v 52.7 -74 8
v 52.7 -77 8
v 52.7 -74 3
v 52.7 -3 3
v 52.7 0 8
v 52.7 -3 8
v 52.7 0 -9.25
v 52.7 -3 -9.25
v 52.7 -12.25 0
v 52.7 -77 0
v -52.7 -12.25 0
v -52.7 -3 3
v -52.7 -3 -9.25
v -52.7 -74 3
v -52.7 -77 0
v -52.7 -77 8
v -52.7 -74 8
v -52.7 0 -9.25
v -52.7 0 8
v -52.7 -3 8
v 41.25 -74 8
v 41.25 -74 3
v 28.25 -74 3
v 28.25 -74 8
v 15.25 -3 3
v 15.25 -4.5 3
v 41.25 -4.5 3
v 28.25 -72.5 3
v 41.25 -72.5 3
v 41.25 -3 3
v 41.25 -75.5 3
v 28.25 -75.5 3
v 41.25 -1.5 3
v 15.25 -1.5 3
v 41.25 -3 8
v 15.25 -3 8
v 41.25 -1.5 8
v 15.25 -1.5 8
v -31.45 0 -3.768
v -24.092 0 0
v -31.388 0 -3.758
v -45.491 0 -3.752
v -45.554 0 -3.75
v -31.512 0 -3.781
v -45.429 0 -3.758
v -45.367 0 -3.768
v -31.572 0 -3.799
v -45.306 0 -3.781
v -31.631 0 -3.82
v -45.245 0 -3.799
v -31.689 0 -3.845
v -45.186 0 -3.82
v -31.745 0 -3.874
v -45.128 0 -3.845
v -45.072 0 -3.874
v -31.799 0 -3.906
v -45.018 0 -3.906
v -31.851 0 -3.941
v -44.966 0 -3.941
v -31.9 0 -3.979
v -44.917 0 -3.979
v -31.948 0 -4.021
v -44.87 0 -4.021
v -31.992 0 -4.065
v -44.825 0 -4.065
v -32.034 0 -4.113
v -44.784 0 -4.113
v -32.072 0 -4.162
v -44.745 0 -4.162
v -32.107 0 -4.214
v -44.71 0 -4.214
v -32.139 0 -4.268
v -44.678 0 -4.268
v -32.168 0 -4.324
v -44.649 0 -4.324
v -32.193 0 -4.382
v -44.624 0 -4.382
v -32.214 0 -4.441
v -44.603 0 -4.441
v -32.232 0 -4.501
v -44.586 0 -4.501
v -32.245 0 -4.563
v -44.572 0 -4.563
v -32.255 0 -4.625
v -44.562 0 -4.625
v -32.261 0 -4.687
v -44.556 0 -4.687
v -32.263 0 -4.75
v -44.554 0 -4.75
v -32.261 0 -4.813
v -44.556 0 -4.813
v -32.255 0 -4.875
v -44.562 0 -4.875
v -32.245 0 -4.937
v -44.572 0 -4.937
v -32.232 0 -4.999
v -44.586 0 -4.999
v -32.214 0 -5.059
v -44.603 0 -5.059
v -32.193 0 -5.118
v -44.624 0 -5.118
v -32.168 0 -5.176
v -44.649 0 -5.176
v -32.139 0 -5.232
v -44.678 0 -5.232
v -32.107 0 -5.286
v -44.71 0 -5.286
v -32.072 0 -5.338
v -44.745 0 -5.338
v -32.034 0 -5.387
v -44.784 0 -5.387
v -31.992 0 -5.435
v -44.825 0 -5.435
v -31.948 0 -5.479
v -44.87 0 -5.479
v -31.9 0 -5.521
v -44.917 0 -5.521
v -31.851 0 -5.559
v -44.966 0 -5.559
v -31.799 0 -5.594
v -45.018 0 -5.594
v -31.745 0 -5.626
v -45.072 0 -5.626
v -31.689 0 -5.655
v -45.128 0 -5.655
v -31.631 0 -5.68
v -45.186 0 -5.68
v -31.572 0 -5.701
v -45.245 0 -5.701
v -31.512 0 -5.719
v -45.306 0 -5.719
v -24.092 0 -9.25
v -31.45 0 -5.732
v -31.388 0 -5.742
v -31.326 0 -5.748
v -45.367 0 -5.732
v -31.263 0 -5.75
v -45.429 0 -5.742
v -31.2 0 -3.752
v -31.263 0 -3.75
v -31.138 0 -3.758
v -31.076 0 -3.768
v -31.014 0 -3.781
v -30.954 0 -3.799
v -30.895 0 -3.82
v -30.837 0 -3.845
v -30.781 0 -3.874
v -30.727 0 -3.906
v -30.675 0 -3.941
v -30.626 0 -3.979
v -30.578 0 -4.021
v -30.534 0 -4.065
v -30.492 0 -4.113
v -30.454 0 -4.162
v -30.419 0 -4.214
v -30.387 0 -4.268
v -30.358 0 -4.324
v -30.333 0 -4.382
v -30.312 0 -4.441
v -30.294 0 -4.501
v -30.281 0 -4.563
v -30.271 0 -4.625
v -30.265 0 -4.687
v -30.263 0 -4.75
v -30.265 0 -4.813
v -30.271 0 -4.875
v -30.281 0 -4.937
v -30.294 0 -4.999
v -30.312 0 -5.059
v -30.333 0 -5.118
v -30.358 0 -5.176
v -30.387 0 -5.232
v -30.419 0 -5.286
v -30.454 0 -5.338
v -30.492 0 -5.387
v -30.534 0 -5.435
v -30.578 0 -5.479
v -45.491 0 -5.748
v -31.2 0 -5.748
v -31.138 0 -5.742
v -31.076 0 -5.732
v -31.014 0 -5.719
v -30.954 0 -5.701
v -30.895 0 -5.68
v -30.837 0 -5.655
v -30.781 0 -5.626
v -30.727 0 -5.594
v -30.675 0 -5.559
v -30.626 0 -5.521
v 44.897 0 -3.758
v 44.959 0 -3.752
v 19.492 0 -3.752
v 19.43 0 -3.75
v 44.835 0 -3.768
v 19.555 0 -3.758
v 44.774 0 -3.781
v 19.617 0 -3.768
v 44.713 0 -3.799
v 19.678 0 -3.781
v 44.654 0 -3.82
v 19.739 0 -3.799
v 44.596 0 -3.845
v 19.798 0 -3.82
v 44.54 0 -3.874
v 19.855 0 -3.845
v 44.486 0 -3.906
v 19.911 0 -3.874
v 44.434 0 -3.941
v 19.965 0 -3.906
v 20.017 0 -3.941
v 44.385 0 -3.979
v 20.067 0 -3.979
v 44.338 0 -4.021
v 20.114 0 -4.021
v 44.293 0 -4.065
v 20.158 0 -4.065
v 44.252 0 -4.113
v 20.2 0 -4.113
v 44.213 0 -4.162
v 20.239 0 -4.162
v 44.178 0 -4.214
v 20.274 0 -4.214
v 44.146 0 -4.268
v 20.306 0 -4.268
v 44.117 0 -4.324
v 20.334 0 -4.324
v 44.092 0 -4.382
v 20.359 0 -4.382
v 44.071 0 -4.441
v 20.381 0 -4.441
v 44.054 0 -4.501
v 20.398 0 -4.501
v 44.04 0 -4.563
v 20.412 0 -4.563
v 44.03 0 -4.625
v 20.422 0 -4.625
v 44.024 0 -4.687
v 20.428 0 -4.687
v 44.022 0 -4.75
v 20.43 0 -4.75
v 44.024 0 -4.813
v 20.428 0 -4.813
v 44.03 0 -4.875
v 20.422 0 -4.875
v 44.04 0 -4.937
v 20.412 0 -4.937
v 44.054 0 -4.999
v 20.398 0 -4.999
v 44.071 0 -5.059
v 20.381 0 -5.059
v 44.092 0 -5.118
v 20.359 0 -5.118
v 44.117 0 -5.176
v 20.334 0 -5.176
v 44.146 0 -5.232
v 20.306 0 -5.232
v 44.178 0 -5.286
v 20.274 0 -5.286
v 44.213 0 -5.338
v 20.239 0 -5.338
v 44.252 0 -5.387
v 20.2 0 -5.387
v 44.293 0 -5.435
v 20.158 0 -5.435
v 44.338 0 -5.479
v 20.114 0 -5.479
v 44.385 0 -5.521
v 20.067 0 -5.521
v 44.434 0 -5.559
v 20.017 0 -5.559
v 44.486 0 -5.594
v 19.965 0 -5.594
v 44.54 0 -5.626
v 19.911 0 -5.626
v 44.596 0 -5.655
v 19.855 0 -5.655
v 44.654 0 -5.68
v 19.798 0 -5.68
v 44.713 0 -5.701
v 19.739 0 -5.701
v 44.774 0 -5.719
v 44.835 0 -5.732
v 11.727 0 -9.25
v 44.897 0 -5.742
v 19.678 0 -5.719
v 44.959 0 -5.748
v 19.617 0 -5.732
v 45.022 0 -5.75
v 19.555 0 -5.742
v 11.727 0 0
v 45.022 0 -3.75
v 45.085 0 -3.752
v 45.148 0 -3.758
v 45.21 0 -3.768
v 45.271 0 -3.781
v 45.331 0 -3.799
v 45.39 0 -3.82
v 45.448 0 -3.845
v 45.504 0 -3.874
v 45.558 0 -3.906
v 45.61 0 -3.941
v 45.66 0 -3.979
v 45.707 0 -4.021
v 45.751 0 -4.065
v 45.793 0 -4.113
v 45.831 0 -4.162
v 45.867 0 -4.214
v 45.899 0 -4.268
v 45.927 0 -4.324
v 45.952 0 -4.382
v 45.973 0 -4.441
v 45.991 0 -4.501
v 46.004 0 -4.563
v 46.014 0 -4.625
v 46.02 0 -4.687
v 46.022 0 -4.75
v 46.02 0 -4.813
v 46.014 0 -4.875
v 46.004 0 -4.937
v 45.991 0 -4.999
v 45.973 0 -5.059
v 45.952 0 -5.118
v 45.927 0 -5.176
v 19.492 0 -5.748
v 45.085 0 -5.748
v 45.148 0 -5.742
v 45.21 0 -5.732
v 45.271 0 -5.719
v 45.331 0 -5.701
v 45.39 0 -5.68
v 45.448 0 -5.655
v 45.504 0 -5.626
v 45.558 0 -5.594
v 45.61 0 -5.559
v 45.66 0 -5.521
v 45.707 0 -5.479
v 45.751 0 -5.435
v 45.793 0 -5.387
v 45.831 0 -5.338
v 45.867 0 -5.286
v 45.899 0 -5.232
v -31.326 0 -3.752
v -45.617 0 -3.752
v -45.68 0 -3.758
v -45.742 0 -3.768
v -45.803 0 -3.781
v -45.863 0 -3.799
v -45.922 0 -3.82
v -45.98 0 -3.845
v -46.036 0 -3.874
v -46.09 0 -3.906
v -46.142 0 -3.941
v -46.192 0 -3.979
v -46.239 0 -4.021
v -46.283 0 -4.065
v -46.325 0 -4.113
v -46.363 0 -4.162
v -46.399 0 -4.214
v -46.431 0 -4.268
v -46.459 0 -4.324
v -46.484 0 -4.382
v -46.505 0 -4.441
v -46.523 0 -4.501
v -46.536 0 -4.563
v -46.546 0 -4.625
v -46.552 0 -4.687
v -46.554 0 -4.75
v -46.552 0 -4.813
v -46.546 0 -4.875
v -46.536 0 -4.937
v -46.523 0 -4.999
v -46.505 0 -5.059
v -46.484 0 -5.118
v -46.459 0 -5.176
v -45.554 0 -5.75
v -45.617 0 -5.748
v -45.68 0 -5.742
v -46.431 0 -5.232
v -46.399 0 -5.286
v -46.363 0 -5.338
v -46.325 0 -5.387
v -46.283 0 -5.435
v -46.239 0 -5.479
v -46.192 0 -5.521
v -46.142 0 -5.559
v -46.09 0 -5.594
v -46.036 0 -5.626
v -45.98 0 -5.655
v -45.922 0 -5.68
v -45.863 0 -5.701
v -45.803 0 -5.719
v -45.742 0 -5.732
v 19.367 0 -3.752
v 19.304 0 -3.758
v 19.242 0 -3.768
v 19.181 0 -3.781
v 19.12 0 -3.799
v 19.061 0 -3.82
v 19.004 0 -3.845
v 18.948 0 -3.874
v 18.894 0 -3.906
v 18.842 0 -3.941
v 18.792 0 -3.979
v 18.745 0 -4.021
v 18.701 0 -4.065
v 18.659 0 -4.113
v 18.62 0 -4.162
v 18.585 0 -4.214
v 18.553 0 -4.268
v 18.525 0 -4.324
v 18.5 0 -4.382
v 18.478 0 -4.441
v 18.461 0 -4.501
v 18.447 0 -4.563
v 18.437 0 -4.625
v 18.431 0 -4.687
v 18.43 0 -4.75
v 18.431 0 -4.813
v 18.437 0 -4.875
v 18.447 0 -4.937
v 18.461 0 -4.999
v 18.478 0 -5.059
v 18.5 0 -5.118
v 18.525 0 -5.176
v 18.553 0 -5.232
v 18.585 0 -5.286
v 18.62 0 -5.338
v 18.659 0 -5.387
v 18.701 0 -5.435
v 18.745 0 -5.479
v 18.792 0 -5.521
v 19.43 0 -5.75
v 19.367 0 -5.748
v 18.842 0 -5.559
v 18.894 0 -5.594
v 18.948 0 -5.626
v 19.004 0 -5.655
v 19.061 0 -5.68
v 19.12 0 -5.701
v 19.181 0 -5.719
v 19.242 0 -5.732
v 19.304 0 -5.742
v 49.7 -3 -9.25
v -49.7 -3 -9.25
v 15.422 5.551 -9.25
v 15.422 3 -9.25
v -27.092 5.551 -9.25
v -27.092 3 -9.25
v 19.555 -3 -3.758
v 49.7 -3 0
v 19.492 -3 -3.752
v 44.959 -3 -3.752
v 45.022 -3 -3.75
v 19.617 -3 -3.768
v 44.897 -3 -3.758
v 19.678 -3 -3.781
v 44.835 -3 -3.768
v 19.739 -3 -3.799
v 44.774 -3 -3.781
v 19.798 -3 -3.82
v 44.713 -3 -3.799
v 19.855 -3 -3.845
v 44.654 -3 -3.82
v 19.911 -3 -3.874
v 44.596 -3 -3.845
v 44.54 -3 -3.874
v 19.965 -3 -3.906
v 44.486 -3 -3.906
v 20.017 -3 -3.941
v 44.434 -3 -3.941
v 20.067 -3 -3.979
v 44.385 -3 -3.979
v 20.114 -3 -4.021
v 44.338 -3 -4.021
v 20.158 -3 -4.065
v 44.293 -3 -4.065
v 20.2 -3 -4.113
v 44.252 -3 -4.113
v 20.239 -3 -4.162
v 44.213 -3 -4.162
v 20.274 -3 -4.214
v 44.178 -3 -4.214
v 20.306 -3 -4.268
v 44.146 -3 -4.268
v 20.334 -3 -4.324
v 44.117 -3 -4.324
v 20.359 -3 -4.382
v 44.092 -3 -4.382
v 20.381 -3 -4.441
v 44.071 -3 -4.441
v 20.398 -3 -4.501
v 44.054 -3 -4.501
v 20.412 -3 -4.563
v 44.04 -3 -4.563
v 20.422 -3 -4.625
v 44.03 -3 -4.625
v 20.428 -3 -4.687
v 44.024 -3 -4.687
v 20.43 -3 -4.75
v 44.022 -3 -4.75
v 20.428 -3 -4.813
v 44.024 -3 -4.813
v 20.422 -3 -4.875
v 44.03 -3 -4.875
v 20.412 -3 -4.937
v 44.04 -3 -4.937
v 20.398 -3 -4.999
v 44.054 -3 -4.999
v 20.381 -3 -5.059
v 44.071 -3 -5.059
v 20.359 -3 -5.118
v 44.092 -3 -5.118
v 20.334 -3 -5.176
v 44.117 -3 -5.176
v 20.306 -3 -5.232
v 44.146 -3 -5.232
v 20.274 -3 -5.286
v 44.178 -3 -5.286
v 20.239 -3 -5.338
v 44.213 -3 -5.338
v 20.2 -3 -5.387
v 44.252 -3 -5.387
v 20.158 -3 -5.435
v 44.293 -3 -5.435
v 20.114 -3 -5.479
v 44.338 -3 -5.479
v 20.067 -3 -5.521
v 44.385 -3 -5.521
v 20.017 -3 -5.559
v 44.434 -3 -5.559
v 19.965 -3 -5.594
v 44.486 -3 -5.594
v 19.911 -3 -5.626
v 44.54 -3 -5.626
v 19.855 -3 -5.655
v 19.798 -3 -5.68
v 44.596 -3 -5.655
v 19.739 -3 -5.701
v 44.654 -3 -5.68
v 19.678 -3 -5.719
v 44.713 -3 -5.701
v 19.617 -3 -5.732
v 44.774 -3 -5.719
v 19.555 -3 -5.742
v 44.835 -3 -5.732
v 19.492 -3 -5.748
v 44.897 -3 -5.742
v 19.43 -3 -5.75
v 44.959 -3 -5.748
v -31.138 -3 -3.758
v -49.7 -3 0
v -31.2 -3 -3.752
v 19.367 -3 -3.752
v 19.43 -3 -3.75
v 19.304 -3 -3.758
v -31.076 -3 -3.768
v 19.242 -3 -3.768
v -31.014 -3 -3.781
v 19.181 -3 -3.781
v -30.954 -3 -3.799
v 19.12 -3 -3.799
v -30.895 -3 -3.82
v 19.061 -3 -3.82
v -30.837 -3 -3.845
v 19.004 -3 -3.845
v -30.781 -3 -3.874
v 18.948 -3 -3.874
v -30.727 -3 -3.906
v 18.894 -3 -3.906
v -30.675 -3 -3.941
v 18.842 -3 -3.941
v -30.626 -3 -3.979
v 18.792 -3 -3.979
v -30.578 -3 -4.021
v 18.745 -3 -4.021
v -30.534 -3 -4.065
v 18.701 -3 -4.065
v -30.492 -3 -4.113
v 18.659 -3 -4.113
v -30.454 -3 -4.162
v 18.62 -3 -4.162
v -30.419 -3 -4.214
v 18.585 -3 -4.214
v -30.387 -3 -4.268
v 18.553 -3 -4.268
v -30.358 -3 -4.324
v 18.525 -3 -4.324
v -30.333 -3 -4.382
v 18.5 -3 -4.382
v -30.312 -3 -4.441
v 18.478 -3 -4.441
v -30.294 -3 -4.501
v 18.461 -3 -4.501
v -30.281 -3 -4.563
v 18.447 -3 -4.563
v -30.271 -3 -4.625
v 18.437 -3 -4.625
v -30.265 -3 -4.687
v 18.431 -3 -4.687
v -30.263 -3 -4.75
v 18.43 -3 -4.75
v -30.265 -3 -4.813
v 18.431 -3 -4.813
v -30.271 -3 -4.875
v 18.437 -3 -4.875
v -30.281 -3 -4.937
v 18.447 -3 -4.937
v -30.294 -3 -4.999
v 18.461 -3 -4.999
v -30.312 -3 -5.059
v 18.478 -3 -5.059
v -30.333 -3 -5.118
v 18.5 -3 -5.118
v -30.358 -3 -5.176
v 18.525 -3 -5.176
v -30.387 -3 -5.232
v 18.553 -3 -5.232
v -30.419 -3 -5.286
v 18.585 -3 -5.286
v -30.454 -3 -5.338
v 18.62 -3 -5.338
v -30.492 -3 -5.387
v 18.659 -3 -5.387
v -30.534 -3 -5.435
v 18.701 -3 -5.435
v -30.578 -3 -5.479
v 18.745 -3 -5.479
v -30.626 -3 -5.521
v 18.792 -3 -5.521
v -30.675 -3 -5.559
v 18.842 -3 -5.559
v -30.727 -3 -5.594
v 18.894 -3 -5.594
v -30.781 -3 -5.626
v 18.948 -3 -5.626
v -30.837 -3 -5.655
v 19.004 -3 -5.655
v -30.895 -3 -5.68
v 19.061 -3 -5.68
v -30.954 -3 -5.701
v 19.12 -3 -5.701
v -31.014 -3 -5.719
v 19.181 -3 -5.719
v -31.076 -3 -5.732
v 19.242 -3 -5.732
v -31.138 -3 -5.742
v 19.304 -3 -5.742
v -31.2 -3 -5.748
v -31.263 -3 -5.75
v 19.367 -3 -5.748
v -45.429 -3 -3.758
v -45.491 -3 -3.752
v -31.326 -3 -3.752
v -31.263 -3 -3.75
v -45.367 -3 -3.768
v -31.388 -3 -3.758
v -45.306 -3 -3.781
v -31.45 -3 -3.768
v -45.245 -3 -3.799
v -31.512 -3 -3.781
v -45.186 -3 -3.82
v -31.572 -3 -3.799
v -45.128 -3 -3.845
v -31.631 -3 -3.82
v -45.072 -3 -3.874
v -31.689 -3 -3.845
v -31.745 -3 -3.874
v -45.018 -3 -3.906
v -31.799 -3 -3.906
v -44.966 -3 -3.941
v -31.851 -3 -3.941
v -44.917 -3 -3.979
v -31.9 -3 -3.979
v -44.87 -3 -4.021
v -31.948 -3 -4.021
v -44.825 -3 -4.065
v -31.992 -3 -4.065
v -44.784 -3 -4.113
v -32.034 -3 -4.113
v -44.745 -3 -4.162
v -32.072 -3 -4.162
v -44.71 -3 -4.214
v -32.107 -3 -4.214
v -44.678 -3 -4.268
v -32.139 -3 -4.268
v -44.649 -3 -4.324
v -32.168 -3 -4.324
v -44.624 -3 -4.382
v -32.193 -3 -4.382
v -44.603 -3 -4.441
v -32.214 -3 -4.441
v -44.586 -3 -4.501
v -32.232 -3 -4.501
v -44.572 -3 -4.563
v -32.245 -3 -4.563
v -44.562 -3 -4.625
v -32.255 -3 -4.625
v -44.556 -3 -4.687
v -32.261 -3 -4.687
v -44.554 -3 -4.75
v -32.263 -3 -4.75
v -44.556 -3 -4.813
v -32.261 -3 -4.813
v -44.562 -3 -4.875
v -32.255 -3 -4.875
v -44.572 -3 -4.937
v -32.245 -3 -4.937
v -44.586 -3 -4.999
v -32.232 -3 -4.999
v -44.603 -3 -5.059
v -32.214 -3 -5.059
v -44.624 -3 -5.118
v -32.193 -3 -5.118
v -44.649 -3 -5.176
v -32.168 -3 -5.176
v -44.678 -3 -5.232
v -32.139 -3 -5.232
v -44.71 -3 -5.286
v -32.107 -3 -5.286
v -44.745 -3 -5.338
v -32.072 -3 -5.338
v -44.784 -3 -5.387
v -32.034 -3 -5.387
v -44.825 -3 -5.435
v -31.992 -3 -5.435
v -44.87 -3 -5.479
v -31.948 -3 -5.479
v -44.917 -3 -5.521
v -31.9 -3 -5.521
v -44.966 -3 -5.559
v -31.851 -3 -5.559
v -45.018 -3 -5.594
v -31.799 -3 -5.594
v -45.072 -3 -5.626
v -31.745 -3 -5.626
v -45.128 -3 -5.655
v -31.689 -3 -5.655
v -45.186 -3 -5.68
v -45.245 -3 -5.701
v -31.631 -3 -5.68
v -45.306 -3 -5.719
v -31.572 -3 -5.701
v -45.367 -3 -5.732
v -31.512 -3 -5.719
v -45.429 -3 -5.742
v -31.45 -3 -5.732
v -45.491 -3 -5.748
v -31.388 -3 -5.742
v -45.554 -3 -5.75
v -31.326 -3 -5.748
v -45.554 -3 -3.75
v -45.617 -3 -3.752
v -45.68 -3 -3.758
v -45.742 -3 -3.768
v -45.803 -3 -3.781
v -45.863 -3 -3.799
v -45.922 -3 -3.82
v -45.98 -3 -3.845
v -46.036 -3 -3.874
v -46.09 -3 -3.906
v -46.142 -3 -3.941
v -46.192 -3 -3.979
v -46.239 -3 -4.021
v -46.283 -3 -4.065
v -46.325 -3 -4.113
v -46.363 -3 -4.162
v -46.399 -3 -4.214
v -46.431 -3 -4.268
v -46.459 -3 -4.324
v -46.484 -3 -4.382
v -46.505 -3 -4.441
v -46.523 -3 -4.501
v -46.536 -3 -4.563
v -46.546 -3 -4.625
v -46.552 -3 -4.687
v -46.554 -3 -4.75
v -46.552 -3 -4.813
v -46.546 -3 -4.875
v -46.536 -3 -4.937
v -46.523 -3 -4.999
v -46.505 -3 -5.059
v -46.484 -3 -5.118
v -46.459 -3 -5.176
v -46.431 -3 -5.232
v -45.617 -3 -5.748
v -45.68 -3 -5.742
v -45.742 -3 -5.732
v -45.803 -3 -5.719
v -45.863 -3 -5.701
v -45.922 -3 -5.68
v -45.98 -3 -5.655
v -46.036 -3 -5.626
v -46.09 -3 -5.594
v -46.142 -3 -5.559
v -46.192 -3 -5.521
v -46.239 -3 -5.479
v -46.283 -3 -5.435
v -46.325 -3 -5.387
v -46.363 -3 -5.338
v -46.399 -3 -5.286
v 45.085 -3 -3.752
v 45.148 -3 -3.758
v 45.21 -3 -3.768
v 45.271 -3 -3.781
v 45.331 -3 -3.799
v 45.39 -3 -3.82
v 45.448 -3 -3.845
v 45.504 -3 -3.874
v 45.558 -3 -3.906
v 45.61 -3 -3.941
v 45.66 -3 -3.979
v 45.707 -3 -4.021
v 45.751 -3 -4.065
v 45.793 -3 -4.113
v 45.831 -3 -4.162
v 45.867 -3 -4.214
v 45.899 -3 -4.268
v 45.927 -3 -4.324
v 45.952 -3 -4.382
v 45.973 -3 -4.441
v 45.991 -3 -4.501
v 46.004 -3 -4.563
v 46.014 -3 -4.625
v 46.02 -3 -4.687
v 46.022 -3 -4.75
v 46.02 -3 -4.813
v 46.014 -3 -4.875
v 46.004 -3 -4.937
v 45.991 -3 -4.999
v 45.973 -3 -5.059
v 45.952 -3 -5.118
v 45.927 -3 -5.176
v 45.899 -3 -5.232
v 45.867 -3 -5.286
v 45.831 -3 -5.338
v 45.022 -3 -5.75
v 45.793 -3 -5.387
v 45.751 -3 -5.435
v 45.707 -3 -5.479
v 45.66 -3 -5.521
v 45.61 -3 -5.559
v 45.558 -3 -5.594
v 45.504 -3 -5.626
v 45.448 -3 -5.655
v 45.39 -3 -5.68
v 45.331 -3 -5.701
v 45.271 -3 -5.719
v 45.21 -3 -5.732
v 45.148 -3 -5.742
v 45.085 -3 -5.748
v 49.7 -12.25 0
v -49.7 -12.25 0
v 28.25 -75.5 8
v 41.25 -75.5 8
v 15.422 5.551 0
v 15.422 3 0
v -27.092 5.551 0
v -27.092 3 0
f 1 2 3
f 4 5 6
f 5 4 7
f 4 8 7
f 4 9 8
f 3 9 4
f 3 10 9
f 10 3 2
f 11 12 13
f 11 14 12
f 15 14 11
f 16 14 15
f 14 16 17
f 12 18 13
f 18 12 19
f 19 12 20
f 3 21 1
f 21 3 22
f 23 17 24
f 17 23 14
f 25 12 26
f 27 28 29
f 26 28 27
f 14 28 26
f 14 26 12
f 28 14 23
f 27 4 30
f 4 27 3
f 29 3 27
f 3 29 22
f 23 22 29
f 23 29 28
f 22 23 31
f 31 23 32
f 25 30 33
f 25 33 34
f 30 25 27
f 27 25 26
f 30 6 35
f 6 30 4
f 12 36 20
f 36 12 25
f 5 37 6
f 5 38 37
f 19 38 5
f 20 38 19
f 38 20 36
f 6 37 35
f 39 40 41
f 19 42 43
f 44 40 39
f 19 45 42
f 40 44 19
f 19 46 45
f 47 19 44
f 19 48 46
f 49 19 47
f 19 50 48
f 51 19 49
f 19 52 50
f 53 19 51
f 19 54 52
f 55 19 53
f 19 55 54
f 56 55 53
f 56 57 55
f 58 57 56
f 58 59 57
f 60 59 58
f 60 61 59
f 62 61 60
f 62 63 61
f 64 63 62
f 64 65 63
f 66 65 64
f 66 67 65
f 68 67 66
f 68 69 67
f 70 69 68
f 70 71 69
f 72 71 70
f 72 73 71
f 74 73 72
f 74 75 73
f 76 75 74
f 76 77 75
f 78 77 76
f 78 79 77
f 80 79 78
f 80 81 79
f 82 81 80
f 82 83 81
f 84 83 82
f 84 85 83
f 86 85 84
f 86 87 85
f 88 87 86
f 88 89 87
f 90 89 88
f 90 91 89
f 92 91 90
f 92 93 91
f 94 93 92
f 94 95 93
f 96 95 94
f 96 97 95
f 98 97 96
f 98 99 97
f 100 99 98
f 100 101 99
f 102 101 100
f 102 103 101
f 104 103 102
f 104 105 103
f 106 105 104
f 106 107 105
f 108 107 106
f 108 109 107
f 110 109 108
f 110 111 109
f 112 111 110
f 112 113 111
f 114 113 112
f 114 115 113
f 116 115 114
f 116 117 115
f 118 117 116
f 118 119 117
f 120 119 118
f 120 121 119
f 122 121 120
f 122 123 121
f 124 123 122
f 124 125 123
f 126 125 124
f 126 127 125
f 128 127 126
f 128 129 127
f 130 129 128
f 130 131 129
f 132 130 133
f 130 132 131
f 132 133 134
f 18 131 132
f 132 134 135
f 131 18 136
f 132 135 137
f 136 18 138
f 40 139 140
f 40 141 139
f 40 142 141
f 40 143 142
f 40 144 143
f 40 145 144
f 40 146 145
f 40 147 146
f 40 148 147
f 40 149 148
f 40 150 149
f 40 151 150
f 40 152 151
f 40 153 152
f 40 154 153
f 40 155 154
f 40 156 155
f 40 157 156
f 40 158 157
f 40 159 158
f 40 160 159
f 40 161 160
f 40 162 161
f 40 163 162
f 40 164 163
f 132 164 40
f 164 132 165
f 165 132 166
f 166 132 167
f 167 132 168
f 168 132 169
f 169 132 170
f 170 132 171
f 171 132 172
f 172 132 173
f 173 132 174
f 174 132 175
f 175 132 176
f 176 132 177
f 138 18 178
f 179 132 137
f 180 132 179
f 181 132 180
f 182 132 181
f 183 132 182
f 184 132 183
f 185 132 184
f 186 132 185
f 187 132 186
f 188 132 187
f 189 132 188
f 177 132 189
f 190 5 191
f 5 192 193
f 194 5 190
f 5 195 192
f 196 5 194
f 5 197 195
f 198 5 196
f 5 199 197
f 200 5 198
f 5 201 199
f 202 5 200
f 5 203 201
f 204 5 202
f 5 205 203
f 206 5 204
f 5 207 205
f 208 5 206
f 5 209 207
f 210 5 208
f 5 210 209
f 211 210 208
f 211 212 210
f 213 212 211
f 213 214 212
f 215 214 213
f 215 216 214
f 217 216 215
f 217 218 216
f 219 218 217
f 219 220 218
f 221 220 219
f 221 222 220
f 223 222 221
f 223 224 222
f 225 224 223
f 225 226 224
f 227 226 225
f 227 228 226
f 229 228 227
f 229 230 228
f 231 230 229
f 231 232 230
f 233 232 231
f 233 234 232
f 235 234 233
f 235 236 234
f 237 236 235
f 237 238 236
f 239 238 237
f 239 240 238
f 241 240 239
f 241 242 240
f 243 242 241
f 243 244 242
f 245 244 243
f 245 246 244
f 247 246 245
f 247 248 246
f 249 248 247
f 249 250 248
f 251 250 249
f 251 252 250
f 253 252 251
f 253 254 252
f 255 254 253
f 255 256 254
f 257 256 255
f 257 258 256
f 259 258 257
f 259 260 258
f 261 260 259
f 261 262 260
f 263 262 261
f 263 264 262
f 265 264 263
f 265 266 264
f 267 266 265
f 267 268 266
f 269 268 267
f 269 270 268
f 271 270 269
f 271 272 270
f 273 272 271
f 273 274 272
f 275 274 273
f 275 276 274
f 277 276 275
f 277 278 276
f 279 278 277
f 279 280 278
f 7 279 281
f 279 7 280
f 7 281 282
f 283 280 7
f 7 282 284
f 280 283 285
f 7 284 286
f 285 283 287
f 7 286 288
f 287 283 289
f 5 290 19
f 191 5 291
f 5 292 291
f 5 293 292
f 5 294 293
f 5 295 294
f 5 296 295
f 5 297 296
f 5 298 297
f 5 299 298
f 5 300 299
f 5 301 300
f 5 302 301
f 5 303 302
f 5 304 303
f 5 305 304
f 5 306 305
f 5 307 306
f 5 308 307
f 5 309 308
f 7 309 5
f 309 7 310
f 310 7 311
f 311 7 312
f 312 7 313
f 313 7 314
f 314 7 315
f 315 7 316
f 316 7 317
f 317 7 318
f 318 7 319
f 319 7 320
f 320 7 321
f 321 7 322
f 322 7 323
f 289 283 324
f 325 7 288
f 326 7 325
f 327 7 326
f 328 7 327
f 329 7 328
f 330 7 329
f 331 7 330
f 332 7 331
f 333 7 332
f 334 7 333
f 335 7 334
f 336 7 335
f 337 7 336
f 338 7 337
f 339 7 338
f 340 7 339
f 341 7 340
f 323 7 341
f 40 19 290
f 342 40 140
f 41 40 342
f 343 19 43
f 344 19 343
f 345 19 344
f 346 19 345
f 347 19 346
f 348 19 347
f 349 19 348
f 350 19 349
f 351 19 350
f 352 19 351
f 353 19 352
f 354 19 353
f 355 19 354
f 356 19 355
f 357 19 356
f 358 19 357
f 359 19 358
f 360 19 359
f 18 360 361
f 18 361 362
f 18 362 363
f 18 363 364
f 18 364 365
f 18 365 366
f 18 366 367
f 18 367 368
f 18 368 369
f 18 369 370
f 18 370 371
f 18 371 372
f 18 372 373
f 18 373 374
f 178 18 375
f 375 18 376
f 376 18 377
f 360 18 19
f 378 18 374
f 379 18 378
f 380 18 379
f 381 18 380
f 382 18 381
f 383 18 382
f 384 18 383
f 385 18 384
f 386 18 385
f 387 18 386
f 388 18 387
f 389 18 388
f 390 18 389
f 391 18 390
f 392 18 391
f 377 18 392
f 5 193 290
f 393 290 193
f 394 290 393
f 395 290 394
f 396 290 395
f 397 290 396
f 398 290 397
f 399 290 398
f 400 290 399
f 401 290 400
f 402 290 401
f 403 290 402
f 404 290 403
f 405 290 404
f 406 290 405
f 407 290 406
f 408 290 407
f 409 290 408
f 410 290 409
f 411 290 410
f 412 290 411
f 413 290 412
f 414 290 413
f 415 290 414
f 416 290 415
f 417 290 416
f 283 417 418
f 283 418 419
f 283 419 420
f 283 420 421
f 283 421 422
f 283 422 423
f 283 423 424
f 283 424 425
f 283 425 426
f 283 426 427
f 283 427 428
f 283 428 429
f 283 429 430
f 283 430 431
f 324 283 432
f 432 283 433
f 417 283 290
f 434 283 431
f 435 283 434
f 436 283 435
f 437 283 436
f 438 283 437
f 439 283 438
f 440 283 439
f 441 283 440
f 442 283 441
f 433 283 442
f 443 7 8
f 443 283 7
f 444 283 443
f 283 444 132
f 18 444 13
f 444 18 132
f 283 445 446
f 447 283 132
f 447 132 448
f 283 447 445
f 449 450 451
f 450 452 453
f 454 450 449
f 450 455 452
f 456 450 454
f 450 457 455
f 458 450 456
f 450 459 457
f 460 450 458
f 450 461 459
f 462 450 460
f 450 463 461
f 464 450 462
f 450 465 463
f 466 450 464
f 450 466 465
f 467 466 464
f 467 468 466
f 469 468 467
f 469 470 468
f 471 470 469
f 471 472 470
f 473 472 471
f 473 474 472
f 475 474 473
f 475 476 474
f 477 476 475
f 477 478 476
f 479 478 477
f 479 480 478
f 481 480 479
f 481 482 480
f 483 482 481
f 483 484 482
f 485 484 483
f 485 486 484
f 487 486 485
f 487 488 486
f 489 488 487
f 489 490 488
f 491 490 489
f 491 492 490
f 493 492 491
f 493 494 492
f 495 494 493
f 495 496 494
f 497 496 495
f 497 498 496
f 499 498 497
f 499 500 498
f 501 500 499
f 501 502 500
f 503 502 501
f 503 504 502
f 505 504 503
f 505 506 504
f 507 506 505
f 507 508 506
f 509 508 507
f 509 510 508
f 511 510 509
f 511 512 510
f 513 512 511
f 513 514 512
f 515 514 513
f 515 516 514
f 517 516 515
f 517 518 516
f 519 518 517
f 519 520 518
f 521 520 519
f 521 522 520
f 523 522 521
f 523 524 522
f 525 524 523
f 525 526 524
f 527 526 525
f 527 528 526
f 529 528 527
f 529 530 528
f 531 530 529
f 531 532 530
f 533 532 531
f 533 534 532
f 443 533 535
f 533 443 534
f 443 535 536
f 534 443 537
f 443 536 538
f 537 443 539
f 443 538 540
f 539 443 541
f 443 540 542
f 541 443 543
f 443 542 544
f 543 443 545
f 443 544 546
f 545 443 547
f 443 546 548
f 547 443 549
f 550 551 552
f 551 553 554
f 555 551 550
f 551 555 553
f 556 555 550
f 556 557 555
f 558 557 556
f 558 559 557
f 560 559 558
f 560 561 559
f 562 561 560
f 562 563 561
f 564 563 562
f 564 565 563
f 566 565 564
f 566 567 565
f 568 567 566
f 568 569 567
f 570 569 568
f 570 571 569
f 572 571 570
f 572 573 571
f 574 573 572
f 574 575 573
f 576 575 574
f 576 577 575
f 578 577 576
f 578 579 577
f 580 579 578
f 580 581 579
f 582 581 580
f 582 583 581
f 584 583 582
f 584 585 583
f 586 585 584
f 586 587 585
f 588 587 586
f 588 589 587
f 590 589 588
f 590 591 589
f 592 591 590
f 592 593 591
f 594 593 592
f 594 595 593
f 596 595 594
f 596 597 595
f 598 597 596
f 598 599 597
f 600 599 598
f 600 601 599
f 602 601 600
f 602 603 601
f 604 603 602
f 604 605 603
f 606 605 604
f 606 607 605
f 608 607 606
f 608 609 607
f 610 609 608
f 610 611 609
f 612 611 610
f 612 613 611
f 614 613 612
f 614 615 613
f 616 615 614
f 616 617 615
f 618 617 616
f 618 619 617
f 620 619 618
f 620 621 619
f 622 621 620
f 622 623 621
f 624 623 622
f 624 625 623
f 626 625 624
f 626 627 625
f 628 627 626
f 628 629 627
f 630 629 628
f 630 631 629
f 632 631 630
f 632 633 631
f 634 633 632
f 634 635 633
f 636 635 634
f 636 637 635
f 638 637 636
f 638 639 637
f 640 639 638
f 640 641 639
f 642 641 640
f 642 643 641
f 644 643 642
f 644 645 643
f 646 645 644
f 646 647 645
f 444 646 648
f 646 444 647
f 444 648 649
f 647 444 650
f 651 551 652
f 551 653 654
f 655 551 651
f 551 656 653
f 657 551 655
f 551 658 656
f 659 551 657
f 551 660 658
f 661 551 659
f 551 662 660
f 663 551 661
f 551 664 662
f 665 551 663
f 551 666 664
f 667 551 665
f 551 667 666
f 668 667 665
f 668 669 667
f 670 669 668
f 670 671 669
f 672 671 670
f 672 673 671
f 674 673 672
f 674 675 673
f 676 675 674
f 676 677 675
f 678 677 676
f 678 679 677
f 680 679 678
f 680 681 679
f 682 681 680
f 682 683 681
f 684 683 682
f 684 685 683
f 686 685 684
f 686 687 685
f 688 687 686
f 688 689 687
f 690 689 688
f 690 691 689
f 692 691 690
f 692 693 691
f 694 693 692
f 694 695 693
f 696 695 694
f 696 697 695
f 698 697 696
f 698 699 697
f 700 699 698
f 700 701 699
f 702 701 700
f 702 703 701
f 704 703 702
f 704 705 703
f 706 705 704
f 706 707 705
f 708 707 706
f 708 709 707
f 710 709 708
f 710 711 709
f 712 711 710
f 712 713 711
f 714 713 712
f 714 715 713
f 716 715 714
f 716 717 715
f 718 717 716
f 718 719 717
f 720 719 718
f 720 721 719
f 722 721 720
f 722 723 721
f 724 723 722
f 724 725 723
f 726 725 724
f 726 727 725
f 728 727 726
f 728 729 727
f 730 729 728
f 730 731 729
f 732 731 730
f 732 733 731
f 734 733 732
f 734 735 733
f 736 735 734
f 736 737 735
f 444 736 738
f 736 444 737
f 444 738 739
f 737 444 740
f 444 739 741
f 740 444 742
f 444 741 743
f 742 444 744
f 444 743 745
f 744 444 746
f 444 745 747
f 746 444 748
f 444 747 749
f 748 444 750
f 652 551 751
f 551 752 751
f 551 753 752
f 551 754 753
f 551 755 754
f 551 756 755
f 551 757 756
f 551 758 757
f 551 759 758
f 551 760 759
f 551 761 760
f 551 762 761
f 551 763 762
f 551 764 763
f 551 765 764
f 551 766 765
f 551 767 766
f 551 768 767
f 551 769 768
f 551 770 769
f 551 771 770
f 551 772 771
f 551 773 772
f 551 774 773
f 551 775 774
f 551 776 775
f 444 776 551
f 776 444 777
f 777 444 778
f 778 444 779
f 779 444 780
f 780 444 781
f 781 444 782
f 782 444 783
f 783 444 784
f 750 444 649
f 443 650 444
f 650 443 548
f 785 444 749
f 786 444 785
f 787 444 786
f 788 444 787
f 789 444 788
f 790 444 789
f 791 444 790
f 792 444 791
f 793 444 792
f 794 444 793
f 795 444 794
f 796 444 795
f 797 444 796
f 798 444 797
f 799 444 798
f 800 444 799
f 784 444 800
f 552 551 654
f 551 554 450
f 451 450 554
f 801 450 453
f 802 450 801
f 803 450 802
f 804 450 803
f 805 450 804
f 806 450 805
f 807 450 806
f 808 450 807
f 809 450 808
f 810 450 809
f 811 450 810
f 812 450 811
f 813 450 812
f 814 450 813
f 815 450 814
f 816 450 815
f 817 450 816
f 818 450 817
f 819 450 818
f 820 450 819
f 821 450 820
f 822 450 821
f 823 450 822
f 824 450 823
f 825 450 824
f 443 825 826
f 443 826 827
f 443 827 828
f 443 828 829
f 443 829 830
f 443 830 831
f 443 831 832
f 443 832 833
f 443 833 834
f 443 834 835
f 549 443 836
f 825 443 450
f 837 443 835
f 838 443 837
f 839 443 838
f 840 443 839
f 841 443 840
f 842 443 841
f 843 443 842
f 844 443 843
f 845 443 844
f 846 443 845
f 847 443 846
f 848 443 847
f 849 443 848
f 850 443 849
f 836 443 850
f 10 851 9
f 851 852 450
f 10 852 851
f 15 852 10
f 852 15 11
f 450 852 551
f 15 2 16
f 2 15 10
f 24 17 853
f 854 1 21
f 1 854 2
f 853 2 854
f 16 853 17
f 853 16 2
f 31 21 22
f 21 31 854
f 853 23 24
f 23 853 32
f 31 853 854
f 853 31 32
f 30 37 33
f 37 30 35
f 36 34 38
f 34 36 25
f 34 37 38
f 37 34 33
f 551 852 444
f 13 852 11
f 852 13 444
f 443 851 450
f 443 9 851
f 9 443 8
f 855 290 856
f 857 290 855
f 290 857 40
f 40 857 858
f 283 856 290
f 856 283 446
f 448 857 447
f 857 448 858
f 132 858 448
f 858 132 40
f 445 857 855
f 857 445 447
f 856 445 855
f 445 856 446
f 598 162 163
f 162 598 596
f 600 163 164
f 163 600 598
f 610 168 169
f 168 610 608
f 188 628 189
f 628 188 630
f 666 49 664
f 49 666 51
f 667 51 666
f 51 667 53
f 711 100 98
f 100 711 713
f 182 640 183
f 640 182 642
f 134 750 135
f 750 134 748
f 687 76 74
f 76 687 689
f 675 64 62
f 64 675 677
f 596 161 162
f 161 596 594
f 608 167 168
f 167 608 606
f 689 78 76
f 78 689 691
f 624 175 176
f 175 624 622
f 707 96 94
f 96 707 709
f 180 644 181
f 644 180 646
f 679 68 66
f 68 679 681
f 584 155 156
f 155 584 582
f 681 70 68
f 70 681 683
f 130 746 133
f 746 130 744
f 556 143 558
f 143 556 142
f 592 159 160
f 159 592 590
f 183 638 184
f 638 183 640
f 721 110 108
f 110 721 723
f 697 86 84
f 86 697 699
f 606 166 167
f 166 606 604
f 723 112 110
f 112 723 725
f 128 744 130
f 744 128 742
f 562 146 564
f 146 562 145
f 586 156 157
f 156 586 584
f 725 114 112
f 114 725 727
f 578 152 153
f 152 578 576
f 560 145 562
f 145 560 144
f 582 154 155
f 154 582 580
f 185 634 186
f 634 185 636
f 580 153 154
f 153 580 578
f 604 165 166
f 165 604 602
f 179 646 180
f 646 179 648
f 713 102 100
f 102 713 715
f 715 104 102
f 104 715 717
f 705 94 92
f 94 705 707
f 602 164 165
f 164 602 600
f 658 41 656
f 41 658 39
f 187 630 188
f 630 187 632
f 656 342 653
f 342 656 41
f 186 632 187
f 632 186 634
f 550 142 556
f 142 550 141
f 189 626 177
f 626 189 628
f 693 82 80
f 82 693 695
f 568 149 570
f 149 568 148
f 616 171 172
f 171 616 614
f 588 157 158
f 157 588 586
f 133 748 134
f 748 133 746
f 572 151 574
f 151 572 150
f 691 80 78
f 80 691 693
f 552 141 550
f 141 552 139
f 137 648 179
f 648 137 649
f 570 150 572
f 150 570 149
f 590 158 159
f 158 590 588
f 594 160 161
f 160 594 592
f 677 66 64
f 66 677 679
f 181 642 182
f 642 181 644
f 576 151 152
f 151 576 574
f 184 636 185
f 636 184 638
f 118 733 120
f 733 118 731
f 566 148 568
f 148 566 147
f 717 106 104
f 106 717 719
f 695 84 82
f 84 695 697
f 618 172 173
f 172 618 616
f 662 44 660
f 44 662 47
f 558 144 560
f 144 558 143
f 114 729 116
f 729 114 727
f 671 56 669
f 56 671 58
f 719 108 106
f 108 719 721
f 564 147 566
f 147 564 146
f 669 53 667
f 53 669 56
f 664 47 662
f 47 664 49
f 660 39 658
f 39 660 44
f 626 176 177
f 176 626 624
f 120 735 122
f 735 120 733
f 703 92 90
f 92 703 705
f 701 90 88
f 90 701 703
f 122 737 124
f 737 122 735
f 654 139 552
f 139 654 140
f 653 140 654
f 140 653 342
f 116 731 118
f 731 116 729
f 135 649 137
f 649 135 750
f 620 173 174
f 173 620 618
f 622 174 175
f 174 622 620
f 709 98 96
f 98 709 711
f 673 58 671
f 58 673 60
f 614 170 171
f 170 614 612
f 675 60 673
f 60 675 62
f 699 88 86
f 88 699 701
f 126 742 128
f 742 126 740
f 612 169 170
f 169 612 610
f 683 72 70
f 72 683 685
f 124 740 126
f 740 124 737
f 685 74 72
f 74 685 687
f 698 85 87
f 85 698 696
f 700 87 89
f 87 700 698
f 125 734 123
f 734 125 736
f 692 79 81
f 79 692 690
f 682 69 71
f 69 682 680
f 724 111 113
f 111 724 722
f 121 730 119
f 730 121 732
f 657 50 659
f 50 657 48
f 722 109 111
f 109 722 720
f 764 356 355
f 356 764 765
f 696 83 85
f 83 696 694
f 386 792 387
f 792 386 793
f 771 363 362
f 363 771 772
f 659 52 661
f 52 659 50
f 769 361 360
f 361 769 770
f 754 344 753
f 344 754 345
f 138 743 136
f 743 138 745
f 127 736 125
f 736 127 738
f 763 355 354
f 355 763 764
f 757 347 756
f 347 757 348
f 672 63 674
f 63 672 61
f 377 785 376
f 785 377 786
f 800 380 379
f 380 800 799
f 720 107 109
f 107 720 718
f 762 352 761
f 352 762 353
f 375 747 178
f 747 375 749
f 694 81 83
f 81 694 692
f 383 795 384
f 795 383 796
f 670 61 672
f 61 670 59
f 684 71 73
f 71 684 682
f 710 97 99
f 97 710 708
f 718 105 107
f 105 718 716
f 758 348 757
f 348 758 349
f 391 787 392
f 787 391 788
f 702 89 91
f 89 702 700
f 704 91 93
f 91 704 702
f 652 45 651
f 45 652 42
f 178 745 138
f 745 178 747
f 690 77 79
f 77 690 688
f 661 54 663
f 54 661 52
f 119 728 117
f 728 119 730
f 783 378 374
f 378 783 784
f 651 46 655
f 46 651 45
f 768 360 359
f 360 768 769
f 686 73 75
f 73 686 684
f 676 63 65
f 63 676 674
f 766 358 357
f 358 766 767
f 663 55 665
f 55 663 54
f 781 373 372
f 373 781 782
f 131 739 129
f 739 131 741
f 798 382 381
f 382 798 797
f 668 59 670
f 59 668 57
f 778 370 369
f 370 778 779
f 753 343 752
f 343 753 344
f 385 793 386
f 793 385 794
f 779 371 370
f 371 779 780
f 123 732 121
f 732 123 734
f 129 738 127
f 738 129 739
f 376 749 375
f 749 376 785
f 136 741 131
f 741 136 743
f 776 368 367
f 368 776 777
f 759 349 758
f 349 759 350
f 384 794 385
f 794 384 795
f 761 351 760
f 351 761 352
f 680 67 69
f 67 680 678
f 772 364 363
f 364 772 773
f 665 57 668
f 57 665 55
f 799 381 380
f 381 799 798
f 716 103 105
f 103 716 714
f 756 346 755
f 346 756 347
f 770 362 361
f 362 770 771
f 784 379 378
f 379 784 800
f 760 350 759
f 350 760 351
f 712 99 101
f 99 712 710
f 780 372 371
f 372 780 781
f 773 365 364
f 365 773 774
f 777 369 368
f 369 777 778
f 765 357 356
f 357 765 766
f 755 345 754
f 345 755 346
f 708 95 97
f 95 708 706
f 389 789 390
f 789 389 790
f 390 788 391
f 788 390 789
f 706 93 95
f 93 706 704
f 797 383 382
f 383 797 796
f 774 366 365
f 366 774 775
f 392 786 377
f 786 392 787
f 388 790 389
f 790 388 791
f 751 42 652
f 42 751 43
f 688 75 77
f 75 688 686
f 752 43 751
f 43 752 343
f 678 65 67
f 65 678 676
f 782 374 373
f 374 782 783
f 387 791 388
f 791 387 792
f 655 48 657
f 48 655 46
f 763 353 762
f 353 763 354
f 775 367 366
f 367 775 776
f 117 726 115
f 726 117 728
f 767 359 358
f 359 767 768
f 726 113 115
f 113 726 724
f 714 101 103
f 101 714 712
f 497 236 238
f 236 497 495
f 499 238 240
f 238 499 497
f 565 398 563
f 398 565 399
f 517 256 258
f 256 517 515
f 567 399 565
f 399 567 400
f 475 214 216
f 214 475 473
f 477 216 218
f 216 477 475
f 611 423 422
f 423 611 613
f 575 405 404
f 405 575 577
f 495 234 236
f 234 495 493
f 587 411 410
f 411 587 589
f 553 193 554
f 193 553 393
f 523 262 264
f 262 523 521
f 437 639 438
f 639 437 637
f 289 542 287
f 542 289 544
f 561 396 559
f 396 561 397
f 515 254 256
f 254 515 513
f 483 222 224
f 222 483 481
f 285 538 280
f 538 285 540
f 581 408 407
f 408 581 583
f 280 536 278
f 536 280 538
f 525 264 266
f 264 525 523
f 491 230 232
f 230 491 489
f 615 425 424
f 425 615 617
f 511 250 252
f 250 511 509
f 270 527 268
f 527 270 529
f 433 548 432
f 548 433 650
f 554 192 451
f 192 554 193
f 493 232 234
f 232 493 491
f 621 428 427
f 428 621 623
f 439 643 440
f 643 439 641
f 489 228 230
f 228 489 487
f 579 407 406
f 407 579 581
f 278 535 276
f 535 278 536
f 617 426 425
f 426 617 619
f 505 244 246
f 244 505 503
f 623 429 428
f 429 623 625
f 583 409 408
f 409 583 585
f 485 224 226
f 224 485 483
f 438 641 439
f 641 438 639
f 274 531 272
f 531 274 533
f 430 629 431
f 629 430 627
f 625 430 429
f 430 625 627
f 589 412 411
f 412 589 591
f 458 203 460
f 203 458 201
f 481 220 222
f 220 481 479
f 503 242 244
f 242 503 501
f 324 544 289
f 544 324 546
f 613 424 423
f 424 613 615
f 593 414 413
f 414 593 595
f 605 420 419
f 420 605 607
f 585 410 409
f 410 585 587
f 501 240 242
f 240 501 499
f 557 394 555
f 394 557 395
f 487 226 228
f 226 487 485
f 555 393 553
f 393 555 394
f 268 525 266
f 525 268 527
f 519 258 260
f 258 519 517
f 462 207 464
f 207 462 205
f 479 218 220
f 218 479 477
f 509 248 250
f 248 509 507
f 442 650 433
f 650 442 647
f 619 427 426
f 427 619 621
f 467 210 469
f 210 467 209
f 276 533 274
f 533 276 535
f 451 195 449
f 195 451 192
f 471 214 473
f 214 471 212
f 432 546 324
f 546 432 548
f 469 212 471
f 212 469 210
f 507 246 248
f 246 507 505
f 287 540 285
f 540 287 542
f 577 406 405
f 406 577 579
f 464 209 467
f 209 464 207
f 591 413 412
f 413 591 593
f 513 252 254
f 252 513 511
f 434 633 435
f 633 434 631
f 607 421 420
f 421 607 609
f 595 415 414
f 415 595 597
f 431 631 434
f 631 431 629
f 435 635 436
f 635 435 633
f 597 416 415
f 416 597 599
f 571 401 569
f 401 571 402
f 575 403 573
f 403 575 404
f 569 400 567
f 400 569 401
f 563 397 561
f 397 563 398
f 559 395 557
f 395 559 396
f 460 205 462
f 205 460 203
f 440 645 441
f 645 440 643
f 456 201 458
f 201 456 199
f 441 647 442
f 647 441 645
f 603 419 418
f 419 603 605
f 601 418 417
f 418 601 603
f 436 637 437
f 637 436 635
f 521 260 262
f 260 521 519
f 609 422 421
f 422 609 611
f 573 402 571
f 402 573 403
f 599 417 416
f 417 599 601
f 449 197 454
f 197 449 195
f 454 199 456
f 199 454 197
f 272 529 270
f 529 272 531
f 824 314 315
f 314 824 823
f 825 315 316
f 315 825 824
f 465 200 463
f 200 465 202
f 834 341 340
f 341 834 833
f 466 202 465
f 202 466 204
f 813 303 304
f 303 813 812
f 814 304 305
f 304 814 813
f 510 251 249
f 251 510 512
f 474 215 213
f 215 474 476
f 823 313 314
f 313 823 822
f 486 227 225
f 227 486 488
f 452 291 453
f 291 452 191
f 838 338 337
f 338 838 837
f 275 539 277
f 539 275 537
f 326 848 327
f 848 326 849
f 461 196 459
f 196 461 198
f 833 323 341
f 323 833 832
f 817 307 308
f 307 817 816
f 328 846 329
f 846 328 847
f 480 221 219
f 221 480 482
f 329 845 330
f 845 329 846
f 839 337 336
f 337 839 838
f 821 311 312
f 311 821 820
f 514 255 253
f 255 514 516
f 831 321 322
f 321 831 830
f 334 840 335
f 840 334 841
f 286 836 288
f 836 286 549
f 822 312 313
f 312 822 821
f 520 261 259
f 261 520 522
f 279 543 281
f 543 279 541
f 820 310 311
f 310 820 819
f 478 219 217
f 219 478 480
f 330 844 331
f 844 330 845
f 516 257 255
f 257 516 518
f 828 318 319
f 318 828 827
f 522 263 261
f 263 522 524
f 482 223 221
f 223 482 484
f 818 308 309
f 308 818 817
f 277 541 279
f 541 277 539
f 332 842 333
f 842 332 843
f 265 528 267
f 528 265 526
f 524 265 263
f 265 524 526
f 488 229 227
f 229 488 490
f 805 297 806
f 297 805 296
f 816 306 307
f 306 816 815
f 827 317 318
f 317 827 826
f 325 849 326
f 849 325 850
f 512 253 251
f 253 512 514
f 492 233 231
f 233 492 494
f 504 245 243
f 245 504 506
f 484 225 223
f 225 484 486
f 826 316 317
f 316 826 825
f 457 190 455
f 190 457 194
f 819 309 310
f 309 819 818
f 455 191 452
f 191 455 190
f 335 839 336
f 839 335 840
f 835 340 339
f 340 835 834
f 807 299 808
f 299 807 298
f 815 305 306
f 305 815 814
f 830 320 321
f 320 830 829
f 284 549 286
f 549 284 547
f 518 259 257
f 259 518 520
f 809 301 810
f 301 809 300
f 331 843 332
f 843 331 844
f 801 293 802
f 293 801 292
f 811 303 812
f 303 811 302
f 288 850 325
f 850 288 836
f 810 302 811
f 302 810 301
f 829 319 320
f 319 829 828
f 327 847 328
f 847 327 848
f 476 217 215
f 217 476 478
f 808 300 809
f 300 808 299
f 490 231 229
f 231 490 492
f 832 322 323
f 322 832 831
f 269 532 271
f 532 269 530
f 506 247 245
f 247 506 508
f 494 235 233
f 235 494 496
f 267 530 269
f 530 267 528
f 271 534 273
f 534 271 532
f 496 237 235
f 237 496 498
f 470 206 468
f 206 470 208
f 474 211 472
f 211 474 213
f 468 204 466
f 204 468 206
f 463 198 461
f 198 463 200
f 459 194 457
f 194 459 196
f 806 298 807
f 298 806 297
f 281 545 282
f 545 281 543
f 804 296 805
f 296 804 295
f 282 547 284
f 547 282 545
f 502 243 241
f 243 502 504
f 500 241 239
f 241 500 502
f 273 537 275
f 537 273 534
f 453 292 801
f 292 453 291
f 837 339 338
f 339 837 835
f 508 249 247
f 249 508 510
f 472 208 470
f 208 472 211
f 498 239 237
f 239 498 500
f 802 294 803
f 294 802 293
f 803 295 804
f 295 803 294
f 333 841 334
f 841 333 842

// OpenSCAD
/*
  
    mach1gto_compass.scad is the code to generate a tray for an iPhone
    or map compass
    
    Copyright (C) 2025  C.Y. Tan
    Contact: cytan299@yahoo.com

    This file is part of the Mach1gto compass tray distribution.

    mach1gto_compass.scad is free software: you can redistribute it and/or modify
    it under the terms of the GNU General Public License as published by
    the Free Software Foundation, either version 3 of the License, or
    (at your option) any later version.

    mach1gto_compass.scad is distributed in the hope that it will be useful,
    but WITHOUT ANY WARRANTY; without even the implied warranty of
    MERCHANTABILITY or FITNESS FOR A PARTICULAR PURPOSE.  See the
    GNU General Public License for more details.

    You should have received a copy of the GNU General Public License
    along with mach1gto_compass.scad.  If not, see
    <http://www.gnu.org/licenses/>.

*/

$fn=100;

// Choose what you want to print by setting it to 1

MAKE_ATTACHMENT = 0;  
MAKE_COMPASS_TRAY = 0;
MAKE_IPHONE_TRAY = 1;


// parameters

/*
  This is the definition of an iPhone SE *including* its case.
  Users can change these numbers to match their phone.
*/

iphone_l = 140.5; // mm, length of the iPhone includes case. See photo.
iphone_w = 71; // mm, width of the iPhone includes case. See photo.
iphone_H = 10; // mm  height of the iPhone
iphone_button_l = 13; //mm, length of the iPhone button indent. See photo.
iphone_onoff_x = 29; // mm, from reference position. See photo.
iphone_vol_x = 29; // mm, from reference position. See photo.
iphone_vol_l = 26; //mm length of the iPhone volume buttons. See photo


/*
  For heavier phones, the gusset length can be increased
*/

gusset_l = 0; //mm


// Do not change the following parameters

base_t = 5; // mm, base thickness

// rectangular part of the base
base_rect_x = 105.4; //mm
base_rect_y0 = 35.35; // mm, left top edge
base_rect_y1 = 37.8382; // mm, right top edge

// dy translation so that the nothing actually hits the base of the Mach1 mount
dyR = 5.5515; //mm

// slot
slot_r = 16.5; //mm

// bracket
bracket_space = 9.25;//mm spacing
bracket_t = 3; //mm thickness of bracket wall

// screw holes
screw_r = 1; // mm

// curved wall
curved_wall_x0 = 2.9004;
curved_wall_y0 = 89.8863;
curved_wall_inner_r = 90; //mm
curved_wall_outer_r = 93; //mm
curved_wall_h = 10; //mm

// back wall
back_wall_l = 69.8927; //mm
back_wall_h = 29.8;
back_wall_t = base_t;
back_wall_curve_r = 7;


// compass tray length
compass_tray_l = base_rect_x + 8.5; //mm, length of the compass tray

module make_base()
{
  union(){

    //  the polygon shape of the base that does not have angled walls
    //  or slots yet or wings
    translate([-base_rect_x/2,-dyR,0]){
      linear_extrude(height=base_t, v=[0,0,1], center=false){

	polygon(points=[[0,0.00],[105.4, 0],[105.4, 40.9015],
			[80.8176,41.4818],[80.8176,53.9502],
			[10.9250,53.9502], [10.9250, 43.1318],
			[0,43.3897],[0,0]]);

	
      } // linear_extrude
    } // translate   



  }// union
}

module make_back_wall()
{
  translate([-41.7750 ,  48.3987, base_t]){
    rotate([90, 0, 0]){
      union(){
	difference(){

	  linear_extrude(height=back_wall_t, v=[0,0,1], center=false){

	    polygon(points=[[0,0.00],[back_wall_l, 0],[69.4166, back_wall_h],
			    [3.5817,back_wall_h],[0,0]]);

	
	  } // linear_extrude	  

	  block_l = 14.5903;
          //remove the top edges for rounding
	  union(){
            //left top edge
	    translate([0, 19.1, -2*back_wall_t]){
	      cube([block_l, 2*block_l, 4*back_wall_t], center = false);
	    }

	    block_r = 12.6;
            // right top edge
	    translate([57.2927, 19.1, -2*back_wall_t]){
	      cube([block_r, 2*block_r, 4*back_wall_t], center = false);
	    }

	    } // union


	} // difference

        // add in the rounded edges which are ellipses
	// create ellipses by changing scale

        // top left rounded edge

	lc_r = 12.2946;
	translate([14.5903, 19.1, back_wall_t/2]){
	  scale([1,10.7/lc_r, 1]){
	    cylinder(r=lc_r, h=back_wall_t, center=true);
	  }
	}

	//top right rounded edge
	rc_r = 12.2949;
	translate([57.2927, 19.1, back_wall_t/2]){
	  scale([1, 10.7/rc_r, 1]){
	    cylinder(r=rc_r, h=back_wall_t, center=true);
	  }
	}

      } // union
    } // rotate
  } // translate
}

module make_slot()
{
  // coordinate of the circular slot  
  x0 = -0.08; 
  y0=19.24; 

  union(){

    // round hole
    translate([x0,y0, 0]){
      cylinder(r=slot_r, h = 4*base_t, center=true );
    }

    // the straight edges

    translate([x0,2*slot_r+y0, 0]){
      cube([2*slot_r, 4*slot_r, 8*base_t], center=true);
    }
    
  }
}

module make_curved_wall()
{
  difference(){
    translate([curved_wall_x0, curved_wall_y0, -curved_wall_h/2]){
      difference(){
	cylinder(r=curved_wall_outer_r, h = curved_wall_h, center = true);
	// remove in inside of the cylinder
	cylinder(r=curved_wall_inner_r, h = 4*curved_wall_h, center = true);
      }

    } // translate

    // remove stuff outside the base
    // outside right wall
    translate([2*curved_wall_outer_r + base_rect_x/2, 2*curved_wall_outer_r, 0]){
      cube([4*curved_wall_outer_r, 4*curved_wall_outer_r, 4*curved_wall_h], center=true);
    }
    // outside left wall
    translate([-2*curved_wall_outer_r - base_rect_x/2, 2*curved_wall_outer_r, 0]){
      cube([4*curved_wall_outer_r, 4*curved_wall_outer_r, 4*curved_wall_h], center=true);
    }

    // left over curved wall
    translate([0,3*curved_wall_outer_r,0]){
      cube([4*curved_wall_outer_r, 4*curved_wall_outer_r, 4*curved_wall_h], center=true);
    }

    // remove stuff to not block the dovetail

    dovetail_w = 42.5640+2; //mm
    wall_t = curved_wall_outer_r - curved_wall_inner_r;

    translate([-27.1174,-dyR,-2*curved_wall_h]){
      cube([dovetail_w, 4*wall_t, 4*curved_wall_h], center=false);
    }
    
  } //union
    

}

module make_brackets()
{

  // left bracket spacer
  translate([-24.1174, -dyR, -bracket_space]){
    union(){
      // space part
      linear_extrude(height=bracket_space, v=[0,0,1], center=false){
	polygon(points=[[0,0],
			[-28.5826, 0], [-28.5826,9.9321],
			[-25.5826, 9.9321],[-25.5826,3],
			[-3,3], [0,0]]);
      }


    } // union
  } // translate

    
  // right bracket spacer
  translate([11.7517, -dyR, -bracket_space]){
    union(){
      // spacer part
      linear_extrude(height=bracket_space, v=[0,0,1], center=false){
	polygon(points=[[0,0],
			[3.695, 3.0], [37.9483,3],
			[37.9483, 17.5009],[40.9483,17.5009],
			[40.9483,0], [0,0]]);
      }

	
    } // union
      
  } // translate 

}

module make_screw_hole(pos)
{
  translate(pos){
    rotate([90,0,0]){
      cylinder(r=screw_r, h=4*bracket_t, center=true);
    }    
  }
}

module make_bracket_screw_holes()
{
  make_screw_hole([-31.2630,0,-4.75]);
  make_screw_hole([-45.5542,0,-4.75]);
  make_screw_hole([19.4295,0,-4.75]);
  make_screw_hole([45.0222,0,-4.75]);      
}


module make_compass_tray()
{
  dtol = 0.025;
  
  translate([base_rect_x/2,-bracket_t,0]){
    rotate([0,-90,0]){
      linear_extrude(height=compass_tray_l, v=[0,0,1], center=false){
	polygon(points=[[0,0], [-bracket_space, 0],
			[-bracket_space, bracket_t],
			[8.75,bracket_t],[8.75, -3.5],
			[6.75,-3.5],[6.75, -2+dtol],
			[bracket_t,-2+dtol],
			[bracket_t,-63-dtol],
			[6.75,-63-dtol],
			[6.75, -61], [8.75,-61],
			[8.75,-68],[0,-68],
			[0,0]
			]);
      }
    }
  }
}

module make_compass_tray_dovetail()
{
  dtol = 0.025;
  
  translate([-24.1174, 0, -(bracket_t*0 + bracket_space)]){
    linear_extrude(height=bracket_space, v=[0,0,1], center=false){
      polygon(points=[[dtol,0],
		      [-3+dtol, bracket_t], 
		      [-3+dtol, 5.5515],
		      [39.5640-dtol, 5.5515], [39.5640-dtol,bracket_t],
		      [35.8691-dtol, 0],
		      [dtol,0]
		      ]);
    }
  }
}

module make_compass_tray_gussets()
{
  dx = compass_tray_l - base_rect_x; // extra length of the tray
  union(){
    translate([bracket_t-base_rect_x/2-dx,-bracket_t,0]){
      rotate([0,-90,0]){
	linear_extrude(height=bracket_t, v=[0,0,1], center=false){
	  polygon(points=[[0,0],
			  [0, -(bracket_space + gusset_l)],
			  [-bracket_space, -gusset_l],
			  [-bracket_space, 0],
			  [0,0]
			  ]);
	}
      }
    }

    translate([bracket_t + base_rect_x/2 - bracket_t,-bracket_t,0]){
      rotate([0,-90,0]){
	linear_extrude(height=bracket_t, v=[0,0,1], center=false){

	  polygon(points=[[0,0],
			  [0, -(bracket_space + gusset_l)],
			  [-bracket_space, -gusset_l],
			  [-bracket_space, 0],
			  [0,0]
			  ]);	  
	}
      }
    }
  }    
}

module make_compass_tray_catch()
{
  catch_x_w = bracket_t; // x width
  catch_y_w = 3.6; // y width
  catch_z_w = 11.1; // z height

  catch_ypos = 35.5; // measured

  echo("******yyy = ", catch_y_w/2 - catch_ypos);

  union(){

  dx = compass_tray_l - base_rect_x; // extra length of the tray    
    //     translate([(-catch_x_w +base_rect_x/2)*0 +bracket_t, -catch_y_w/2 - catch_ypos, bracket_t]){        
    // new
    translate([-base_rect_x/2-dx+bracket_t, -catch_y_w/2 - catch_ypos, bracket_t]){        
      rotate([90,0,180]){
	linear_extrude(height=catch_y_w, v=[0,0,1], center=false){
	  polygon(points=[[0,0], 
			  [-2,7.1], [-5.4,7.1],
			  [-5.4,5.1],[-7.1,5.1],
			  [-8.8,7.1],[-8.8,catch_z_w],
			  [3,catch_z_w],[3,0],
			  [0,0]
			  ]
		  );
	} // extrude
      } // rotate
    } // translate

    guss_l = 13.6; // length of the gusset
    translate([-base_rect_x/2-dx, -catch_ypos-guss_l/2,0]){
      cube([catch_x_w,guss_l,catch_z_w + bracket_t], center=false);
    }

  } // union

}

module make_iphone_tray_gussets()
{
  union(){
    translate([bracket_t-base_rect_x/2,-bracket_t,0]){
      rotate([0,-90,0]){
	linear_extrude(height=bracket_t, v=[0,0,1], center=false){
	  polygon(points=[[0,0],
			  [0, -(bracket_space + gusset_l)],
			  [-bracket_space, -gusset_l],
			  [-bracket_space, 0],
			  [0,0]
			  ]);
	}
      }
    }

    translate([bracket_t + base_rect_x/2 - bracket_t,-bracket_t,0]){
      rotate([0,-90,0]){
	linear_extrude(height=bracket_t, v=[0,0,1], center=false){

	  polygon(points=[[0,0],
			  [0, -(bracket_space + gusset_l)],
			  [-bracket_space, -gusset_l],
			  [-bracket_space, 0],
			  [0,0]
			  ]);	  
	}
      }
    }
  }    
}




module make_iphone_tray()
{
  dtol = 0.025;
  iphone_h = iphone_H/2; // make the retaining walls half the height
			 // of the iPhone

  difference(){
    translate([base_rect_x/2,-bracket_t,0]){
      rotate([0,-90,0]){
	linear_extrude(height=base_rect_x, v=[0,0,1], center=false){
	  polygon(points=[[0,0], [-bracket_space, 0],
			  [-bracket_space, bracket_t],
			  [iphone_h + bracket_t,bracket_t],
			  [iphone_h + bracket_t, 0],
			  [bracket_t,0],[bracket_t, -iphone_w],
			  [iphone_h + bracket_t, -iphone_w],
			  [iphone_h + bracket_t, -(iphone_w+bracket_t)],
			  [0, -(iphone_w + bracket_t)],
			  [0,0]
			  ]);
	} // linear extrude
      }// rotate
    } // translate

    // make slot for on/off button

    // the y position has to be shifted because my (0,0) position
    // is at the centre of the phone

    onoff_x = iphone_l/2 - (iphone_onoff_x + iphone_button_l); 
    onoff_button_w = iphone_button_l; //mm, width of slot for 1 button
    /*    
    echo("**************");
    echo("on/off button x pos = ", onoff_x);
    echo("**************");
    */
    translate([onoff_x,(-(iphone_w+bracket_t) - bracket_t/2), bracket_t]){    
      cube([onoff_button_w, bracket_t, 2*iphone_h], center=false);
    }

    // make slot for the volume buttons
    vol_x = iphone_l/2-(iphone_vol_x + iphone_vol_l);
    
    /*
    echo("**************");
    echo("vol button x pos = ", vol_x);    
    echo("**************");
    */

    vol_button_w = iphone_vol_l;
    translate([vol_x, -bracket_t - bracket_t/2,bracket_t]){        
      cube([vol_button_w, bracket_t, 2*iphone_h], center=false);
    }

  } // difference
}



/********
  Entry point
*********/

union(){

  //********************************  
  // make the part that will be attached to the Mach1gto
  //********************************

  if (MAKE_ATTACHMENT == 1){
    translate([0, dyR, 0]){
    union(){
      difference(){
	union(){
	  make_base();
	  make_back_wall();
	}
	make_slot();
      }


      make_curved_wall();

      difference(){
	make_brackets();
	make_bracket_screw_holes();
      }
      
    } //union
    }
  }
  //********************************    




  //********************************  
  // make the part for the compass or iphone
  //********************************

  //--------------------------------
  // for compass
  //--------------------------------

  if(MAKE_COMPASS_TRAY == 1){
    difference(){

      union(){
	make_compass_tray();
	make_compass_tray_dovetail();
	make_compass_tray_gussets();

	make_compass_tray_catch();
      }

      make_bracket_screw_holes();
      /*
      translate([-100-70,-100,-25]){
	cube([200, 150, 50], center = false);
      
	}
      */
      
    }
  }
  
  //--------------------------------
  // for iPhone or Android
  //--------------------------------

  if(MAKE_IPHONE_TRAY == 1){
    difference(){

      union(){
	make_iphone_tray();
	make_compass_tray_dovetail();
	make_iphone_tray_gussets();
      }

      make_bracket_screw_holes();

    }
  }


} // union
